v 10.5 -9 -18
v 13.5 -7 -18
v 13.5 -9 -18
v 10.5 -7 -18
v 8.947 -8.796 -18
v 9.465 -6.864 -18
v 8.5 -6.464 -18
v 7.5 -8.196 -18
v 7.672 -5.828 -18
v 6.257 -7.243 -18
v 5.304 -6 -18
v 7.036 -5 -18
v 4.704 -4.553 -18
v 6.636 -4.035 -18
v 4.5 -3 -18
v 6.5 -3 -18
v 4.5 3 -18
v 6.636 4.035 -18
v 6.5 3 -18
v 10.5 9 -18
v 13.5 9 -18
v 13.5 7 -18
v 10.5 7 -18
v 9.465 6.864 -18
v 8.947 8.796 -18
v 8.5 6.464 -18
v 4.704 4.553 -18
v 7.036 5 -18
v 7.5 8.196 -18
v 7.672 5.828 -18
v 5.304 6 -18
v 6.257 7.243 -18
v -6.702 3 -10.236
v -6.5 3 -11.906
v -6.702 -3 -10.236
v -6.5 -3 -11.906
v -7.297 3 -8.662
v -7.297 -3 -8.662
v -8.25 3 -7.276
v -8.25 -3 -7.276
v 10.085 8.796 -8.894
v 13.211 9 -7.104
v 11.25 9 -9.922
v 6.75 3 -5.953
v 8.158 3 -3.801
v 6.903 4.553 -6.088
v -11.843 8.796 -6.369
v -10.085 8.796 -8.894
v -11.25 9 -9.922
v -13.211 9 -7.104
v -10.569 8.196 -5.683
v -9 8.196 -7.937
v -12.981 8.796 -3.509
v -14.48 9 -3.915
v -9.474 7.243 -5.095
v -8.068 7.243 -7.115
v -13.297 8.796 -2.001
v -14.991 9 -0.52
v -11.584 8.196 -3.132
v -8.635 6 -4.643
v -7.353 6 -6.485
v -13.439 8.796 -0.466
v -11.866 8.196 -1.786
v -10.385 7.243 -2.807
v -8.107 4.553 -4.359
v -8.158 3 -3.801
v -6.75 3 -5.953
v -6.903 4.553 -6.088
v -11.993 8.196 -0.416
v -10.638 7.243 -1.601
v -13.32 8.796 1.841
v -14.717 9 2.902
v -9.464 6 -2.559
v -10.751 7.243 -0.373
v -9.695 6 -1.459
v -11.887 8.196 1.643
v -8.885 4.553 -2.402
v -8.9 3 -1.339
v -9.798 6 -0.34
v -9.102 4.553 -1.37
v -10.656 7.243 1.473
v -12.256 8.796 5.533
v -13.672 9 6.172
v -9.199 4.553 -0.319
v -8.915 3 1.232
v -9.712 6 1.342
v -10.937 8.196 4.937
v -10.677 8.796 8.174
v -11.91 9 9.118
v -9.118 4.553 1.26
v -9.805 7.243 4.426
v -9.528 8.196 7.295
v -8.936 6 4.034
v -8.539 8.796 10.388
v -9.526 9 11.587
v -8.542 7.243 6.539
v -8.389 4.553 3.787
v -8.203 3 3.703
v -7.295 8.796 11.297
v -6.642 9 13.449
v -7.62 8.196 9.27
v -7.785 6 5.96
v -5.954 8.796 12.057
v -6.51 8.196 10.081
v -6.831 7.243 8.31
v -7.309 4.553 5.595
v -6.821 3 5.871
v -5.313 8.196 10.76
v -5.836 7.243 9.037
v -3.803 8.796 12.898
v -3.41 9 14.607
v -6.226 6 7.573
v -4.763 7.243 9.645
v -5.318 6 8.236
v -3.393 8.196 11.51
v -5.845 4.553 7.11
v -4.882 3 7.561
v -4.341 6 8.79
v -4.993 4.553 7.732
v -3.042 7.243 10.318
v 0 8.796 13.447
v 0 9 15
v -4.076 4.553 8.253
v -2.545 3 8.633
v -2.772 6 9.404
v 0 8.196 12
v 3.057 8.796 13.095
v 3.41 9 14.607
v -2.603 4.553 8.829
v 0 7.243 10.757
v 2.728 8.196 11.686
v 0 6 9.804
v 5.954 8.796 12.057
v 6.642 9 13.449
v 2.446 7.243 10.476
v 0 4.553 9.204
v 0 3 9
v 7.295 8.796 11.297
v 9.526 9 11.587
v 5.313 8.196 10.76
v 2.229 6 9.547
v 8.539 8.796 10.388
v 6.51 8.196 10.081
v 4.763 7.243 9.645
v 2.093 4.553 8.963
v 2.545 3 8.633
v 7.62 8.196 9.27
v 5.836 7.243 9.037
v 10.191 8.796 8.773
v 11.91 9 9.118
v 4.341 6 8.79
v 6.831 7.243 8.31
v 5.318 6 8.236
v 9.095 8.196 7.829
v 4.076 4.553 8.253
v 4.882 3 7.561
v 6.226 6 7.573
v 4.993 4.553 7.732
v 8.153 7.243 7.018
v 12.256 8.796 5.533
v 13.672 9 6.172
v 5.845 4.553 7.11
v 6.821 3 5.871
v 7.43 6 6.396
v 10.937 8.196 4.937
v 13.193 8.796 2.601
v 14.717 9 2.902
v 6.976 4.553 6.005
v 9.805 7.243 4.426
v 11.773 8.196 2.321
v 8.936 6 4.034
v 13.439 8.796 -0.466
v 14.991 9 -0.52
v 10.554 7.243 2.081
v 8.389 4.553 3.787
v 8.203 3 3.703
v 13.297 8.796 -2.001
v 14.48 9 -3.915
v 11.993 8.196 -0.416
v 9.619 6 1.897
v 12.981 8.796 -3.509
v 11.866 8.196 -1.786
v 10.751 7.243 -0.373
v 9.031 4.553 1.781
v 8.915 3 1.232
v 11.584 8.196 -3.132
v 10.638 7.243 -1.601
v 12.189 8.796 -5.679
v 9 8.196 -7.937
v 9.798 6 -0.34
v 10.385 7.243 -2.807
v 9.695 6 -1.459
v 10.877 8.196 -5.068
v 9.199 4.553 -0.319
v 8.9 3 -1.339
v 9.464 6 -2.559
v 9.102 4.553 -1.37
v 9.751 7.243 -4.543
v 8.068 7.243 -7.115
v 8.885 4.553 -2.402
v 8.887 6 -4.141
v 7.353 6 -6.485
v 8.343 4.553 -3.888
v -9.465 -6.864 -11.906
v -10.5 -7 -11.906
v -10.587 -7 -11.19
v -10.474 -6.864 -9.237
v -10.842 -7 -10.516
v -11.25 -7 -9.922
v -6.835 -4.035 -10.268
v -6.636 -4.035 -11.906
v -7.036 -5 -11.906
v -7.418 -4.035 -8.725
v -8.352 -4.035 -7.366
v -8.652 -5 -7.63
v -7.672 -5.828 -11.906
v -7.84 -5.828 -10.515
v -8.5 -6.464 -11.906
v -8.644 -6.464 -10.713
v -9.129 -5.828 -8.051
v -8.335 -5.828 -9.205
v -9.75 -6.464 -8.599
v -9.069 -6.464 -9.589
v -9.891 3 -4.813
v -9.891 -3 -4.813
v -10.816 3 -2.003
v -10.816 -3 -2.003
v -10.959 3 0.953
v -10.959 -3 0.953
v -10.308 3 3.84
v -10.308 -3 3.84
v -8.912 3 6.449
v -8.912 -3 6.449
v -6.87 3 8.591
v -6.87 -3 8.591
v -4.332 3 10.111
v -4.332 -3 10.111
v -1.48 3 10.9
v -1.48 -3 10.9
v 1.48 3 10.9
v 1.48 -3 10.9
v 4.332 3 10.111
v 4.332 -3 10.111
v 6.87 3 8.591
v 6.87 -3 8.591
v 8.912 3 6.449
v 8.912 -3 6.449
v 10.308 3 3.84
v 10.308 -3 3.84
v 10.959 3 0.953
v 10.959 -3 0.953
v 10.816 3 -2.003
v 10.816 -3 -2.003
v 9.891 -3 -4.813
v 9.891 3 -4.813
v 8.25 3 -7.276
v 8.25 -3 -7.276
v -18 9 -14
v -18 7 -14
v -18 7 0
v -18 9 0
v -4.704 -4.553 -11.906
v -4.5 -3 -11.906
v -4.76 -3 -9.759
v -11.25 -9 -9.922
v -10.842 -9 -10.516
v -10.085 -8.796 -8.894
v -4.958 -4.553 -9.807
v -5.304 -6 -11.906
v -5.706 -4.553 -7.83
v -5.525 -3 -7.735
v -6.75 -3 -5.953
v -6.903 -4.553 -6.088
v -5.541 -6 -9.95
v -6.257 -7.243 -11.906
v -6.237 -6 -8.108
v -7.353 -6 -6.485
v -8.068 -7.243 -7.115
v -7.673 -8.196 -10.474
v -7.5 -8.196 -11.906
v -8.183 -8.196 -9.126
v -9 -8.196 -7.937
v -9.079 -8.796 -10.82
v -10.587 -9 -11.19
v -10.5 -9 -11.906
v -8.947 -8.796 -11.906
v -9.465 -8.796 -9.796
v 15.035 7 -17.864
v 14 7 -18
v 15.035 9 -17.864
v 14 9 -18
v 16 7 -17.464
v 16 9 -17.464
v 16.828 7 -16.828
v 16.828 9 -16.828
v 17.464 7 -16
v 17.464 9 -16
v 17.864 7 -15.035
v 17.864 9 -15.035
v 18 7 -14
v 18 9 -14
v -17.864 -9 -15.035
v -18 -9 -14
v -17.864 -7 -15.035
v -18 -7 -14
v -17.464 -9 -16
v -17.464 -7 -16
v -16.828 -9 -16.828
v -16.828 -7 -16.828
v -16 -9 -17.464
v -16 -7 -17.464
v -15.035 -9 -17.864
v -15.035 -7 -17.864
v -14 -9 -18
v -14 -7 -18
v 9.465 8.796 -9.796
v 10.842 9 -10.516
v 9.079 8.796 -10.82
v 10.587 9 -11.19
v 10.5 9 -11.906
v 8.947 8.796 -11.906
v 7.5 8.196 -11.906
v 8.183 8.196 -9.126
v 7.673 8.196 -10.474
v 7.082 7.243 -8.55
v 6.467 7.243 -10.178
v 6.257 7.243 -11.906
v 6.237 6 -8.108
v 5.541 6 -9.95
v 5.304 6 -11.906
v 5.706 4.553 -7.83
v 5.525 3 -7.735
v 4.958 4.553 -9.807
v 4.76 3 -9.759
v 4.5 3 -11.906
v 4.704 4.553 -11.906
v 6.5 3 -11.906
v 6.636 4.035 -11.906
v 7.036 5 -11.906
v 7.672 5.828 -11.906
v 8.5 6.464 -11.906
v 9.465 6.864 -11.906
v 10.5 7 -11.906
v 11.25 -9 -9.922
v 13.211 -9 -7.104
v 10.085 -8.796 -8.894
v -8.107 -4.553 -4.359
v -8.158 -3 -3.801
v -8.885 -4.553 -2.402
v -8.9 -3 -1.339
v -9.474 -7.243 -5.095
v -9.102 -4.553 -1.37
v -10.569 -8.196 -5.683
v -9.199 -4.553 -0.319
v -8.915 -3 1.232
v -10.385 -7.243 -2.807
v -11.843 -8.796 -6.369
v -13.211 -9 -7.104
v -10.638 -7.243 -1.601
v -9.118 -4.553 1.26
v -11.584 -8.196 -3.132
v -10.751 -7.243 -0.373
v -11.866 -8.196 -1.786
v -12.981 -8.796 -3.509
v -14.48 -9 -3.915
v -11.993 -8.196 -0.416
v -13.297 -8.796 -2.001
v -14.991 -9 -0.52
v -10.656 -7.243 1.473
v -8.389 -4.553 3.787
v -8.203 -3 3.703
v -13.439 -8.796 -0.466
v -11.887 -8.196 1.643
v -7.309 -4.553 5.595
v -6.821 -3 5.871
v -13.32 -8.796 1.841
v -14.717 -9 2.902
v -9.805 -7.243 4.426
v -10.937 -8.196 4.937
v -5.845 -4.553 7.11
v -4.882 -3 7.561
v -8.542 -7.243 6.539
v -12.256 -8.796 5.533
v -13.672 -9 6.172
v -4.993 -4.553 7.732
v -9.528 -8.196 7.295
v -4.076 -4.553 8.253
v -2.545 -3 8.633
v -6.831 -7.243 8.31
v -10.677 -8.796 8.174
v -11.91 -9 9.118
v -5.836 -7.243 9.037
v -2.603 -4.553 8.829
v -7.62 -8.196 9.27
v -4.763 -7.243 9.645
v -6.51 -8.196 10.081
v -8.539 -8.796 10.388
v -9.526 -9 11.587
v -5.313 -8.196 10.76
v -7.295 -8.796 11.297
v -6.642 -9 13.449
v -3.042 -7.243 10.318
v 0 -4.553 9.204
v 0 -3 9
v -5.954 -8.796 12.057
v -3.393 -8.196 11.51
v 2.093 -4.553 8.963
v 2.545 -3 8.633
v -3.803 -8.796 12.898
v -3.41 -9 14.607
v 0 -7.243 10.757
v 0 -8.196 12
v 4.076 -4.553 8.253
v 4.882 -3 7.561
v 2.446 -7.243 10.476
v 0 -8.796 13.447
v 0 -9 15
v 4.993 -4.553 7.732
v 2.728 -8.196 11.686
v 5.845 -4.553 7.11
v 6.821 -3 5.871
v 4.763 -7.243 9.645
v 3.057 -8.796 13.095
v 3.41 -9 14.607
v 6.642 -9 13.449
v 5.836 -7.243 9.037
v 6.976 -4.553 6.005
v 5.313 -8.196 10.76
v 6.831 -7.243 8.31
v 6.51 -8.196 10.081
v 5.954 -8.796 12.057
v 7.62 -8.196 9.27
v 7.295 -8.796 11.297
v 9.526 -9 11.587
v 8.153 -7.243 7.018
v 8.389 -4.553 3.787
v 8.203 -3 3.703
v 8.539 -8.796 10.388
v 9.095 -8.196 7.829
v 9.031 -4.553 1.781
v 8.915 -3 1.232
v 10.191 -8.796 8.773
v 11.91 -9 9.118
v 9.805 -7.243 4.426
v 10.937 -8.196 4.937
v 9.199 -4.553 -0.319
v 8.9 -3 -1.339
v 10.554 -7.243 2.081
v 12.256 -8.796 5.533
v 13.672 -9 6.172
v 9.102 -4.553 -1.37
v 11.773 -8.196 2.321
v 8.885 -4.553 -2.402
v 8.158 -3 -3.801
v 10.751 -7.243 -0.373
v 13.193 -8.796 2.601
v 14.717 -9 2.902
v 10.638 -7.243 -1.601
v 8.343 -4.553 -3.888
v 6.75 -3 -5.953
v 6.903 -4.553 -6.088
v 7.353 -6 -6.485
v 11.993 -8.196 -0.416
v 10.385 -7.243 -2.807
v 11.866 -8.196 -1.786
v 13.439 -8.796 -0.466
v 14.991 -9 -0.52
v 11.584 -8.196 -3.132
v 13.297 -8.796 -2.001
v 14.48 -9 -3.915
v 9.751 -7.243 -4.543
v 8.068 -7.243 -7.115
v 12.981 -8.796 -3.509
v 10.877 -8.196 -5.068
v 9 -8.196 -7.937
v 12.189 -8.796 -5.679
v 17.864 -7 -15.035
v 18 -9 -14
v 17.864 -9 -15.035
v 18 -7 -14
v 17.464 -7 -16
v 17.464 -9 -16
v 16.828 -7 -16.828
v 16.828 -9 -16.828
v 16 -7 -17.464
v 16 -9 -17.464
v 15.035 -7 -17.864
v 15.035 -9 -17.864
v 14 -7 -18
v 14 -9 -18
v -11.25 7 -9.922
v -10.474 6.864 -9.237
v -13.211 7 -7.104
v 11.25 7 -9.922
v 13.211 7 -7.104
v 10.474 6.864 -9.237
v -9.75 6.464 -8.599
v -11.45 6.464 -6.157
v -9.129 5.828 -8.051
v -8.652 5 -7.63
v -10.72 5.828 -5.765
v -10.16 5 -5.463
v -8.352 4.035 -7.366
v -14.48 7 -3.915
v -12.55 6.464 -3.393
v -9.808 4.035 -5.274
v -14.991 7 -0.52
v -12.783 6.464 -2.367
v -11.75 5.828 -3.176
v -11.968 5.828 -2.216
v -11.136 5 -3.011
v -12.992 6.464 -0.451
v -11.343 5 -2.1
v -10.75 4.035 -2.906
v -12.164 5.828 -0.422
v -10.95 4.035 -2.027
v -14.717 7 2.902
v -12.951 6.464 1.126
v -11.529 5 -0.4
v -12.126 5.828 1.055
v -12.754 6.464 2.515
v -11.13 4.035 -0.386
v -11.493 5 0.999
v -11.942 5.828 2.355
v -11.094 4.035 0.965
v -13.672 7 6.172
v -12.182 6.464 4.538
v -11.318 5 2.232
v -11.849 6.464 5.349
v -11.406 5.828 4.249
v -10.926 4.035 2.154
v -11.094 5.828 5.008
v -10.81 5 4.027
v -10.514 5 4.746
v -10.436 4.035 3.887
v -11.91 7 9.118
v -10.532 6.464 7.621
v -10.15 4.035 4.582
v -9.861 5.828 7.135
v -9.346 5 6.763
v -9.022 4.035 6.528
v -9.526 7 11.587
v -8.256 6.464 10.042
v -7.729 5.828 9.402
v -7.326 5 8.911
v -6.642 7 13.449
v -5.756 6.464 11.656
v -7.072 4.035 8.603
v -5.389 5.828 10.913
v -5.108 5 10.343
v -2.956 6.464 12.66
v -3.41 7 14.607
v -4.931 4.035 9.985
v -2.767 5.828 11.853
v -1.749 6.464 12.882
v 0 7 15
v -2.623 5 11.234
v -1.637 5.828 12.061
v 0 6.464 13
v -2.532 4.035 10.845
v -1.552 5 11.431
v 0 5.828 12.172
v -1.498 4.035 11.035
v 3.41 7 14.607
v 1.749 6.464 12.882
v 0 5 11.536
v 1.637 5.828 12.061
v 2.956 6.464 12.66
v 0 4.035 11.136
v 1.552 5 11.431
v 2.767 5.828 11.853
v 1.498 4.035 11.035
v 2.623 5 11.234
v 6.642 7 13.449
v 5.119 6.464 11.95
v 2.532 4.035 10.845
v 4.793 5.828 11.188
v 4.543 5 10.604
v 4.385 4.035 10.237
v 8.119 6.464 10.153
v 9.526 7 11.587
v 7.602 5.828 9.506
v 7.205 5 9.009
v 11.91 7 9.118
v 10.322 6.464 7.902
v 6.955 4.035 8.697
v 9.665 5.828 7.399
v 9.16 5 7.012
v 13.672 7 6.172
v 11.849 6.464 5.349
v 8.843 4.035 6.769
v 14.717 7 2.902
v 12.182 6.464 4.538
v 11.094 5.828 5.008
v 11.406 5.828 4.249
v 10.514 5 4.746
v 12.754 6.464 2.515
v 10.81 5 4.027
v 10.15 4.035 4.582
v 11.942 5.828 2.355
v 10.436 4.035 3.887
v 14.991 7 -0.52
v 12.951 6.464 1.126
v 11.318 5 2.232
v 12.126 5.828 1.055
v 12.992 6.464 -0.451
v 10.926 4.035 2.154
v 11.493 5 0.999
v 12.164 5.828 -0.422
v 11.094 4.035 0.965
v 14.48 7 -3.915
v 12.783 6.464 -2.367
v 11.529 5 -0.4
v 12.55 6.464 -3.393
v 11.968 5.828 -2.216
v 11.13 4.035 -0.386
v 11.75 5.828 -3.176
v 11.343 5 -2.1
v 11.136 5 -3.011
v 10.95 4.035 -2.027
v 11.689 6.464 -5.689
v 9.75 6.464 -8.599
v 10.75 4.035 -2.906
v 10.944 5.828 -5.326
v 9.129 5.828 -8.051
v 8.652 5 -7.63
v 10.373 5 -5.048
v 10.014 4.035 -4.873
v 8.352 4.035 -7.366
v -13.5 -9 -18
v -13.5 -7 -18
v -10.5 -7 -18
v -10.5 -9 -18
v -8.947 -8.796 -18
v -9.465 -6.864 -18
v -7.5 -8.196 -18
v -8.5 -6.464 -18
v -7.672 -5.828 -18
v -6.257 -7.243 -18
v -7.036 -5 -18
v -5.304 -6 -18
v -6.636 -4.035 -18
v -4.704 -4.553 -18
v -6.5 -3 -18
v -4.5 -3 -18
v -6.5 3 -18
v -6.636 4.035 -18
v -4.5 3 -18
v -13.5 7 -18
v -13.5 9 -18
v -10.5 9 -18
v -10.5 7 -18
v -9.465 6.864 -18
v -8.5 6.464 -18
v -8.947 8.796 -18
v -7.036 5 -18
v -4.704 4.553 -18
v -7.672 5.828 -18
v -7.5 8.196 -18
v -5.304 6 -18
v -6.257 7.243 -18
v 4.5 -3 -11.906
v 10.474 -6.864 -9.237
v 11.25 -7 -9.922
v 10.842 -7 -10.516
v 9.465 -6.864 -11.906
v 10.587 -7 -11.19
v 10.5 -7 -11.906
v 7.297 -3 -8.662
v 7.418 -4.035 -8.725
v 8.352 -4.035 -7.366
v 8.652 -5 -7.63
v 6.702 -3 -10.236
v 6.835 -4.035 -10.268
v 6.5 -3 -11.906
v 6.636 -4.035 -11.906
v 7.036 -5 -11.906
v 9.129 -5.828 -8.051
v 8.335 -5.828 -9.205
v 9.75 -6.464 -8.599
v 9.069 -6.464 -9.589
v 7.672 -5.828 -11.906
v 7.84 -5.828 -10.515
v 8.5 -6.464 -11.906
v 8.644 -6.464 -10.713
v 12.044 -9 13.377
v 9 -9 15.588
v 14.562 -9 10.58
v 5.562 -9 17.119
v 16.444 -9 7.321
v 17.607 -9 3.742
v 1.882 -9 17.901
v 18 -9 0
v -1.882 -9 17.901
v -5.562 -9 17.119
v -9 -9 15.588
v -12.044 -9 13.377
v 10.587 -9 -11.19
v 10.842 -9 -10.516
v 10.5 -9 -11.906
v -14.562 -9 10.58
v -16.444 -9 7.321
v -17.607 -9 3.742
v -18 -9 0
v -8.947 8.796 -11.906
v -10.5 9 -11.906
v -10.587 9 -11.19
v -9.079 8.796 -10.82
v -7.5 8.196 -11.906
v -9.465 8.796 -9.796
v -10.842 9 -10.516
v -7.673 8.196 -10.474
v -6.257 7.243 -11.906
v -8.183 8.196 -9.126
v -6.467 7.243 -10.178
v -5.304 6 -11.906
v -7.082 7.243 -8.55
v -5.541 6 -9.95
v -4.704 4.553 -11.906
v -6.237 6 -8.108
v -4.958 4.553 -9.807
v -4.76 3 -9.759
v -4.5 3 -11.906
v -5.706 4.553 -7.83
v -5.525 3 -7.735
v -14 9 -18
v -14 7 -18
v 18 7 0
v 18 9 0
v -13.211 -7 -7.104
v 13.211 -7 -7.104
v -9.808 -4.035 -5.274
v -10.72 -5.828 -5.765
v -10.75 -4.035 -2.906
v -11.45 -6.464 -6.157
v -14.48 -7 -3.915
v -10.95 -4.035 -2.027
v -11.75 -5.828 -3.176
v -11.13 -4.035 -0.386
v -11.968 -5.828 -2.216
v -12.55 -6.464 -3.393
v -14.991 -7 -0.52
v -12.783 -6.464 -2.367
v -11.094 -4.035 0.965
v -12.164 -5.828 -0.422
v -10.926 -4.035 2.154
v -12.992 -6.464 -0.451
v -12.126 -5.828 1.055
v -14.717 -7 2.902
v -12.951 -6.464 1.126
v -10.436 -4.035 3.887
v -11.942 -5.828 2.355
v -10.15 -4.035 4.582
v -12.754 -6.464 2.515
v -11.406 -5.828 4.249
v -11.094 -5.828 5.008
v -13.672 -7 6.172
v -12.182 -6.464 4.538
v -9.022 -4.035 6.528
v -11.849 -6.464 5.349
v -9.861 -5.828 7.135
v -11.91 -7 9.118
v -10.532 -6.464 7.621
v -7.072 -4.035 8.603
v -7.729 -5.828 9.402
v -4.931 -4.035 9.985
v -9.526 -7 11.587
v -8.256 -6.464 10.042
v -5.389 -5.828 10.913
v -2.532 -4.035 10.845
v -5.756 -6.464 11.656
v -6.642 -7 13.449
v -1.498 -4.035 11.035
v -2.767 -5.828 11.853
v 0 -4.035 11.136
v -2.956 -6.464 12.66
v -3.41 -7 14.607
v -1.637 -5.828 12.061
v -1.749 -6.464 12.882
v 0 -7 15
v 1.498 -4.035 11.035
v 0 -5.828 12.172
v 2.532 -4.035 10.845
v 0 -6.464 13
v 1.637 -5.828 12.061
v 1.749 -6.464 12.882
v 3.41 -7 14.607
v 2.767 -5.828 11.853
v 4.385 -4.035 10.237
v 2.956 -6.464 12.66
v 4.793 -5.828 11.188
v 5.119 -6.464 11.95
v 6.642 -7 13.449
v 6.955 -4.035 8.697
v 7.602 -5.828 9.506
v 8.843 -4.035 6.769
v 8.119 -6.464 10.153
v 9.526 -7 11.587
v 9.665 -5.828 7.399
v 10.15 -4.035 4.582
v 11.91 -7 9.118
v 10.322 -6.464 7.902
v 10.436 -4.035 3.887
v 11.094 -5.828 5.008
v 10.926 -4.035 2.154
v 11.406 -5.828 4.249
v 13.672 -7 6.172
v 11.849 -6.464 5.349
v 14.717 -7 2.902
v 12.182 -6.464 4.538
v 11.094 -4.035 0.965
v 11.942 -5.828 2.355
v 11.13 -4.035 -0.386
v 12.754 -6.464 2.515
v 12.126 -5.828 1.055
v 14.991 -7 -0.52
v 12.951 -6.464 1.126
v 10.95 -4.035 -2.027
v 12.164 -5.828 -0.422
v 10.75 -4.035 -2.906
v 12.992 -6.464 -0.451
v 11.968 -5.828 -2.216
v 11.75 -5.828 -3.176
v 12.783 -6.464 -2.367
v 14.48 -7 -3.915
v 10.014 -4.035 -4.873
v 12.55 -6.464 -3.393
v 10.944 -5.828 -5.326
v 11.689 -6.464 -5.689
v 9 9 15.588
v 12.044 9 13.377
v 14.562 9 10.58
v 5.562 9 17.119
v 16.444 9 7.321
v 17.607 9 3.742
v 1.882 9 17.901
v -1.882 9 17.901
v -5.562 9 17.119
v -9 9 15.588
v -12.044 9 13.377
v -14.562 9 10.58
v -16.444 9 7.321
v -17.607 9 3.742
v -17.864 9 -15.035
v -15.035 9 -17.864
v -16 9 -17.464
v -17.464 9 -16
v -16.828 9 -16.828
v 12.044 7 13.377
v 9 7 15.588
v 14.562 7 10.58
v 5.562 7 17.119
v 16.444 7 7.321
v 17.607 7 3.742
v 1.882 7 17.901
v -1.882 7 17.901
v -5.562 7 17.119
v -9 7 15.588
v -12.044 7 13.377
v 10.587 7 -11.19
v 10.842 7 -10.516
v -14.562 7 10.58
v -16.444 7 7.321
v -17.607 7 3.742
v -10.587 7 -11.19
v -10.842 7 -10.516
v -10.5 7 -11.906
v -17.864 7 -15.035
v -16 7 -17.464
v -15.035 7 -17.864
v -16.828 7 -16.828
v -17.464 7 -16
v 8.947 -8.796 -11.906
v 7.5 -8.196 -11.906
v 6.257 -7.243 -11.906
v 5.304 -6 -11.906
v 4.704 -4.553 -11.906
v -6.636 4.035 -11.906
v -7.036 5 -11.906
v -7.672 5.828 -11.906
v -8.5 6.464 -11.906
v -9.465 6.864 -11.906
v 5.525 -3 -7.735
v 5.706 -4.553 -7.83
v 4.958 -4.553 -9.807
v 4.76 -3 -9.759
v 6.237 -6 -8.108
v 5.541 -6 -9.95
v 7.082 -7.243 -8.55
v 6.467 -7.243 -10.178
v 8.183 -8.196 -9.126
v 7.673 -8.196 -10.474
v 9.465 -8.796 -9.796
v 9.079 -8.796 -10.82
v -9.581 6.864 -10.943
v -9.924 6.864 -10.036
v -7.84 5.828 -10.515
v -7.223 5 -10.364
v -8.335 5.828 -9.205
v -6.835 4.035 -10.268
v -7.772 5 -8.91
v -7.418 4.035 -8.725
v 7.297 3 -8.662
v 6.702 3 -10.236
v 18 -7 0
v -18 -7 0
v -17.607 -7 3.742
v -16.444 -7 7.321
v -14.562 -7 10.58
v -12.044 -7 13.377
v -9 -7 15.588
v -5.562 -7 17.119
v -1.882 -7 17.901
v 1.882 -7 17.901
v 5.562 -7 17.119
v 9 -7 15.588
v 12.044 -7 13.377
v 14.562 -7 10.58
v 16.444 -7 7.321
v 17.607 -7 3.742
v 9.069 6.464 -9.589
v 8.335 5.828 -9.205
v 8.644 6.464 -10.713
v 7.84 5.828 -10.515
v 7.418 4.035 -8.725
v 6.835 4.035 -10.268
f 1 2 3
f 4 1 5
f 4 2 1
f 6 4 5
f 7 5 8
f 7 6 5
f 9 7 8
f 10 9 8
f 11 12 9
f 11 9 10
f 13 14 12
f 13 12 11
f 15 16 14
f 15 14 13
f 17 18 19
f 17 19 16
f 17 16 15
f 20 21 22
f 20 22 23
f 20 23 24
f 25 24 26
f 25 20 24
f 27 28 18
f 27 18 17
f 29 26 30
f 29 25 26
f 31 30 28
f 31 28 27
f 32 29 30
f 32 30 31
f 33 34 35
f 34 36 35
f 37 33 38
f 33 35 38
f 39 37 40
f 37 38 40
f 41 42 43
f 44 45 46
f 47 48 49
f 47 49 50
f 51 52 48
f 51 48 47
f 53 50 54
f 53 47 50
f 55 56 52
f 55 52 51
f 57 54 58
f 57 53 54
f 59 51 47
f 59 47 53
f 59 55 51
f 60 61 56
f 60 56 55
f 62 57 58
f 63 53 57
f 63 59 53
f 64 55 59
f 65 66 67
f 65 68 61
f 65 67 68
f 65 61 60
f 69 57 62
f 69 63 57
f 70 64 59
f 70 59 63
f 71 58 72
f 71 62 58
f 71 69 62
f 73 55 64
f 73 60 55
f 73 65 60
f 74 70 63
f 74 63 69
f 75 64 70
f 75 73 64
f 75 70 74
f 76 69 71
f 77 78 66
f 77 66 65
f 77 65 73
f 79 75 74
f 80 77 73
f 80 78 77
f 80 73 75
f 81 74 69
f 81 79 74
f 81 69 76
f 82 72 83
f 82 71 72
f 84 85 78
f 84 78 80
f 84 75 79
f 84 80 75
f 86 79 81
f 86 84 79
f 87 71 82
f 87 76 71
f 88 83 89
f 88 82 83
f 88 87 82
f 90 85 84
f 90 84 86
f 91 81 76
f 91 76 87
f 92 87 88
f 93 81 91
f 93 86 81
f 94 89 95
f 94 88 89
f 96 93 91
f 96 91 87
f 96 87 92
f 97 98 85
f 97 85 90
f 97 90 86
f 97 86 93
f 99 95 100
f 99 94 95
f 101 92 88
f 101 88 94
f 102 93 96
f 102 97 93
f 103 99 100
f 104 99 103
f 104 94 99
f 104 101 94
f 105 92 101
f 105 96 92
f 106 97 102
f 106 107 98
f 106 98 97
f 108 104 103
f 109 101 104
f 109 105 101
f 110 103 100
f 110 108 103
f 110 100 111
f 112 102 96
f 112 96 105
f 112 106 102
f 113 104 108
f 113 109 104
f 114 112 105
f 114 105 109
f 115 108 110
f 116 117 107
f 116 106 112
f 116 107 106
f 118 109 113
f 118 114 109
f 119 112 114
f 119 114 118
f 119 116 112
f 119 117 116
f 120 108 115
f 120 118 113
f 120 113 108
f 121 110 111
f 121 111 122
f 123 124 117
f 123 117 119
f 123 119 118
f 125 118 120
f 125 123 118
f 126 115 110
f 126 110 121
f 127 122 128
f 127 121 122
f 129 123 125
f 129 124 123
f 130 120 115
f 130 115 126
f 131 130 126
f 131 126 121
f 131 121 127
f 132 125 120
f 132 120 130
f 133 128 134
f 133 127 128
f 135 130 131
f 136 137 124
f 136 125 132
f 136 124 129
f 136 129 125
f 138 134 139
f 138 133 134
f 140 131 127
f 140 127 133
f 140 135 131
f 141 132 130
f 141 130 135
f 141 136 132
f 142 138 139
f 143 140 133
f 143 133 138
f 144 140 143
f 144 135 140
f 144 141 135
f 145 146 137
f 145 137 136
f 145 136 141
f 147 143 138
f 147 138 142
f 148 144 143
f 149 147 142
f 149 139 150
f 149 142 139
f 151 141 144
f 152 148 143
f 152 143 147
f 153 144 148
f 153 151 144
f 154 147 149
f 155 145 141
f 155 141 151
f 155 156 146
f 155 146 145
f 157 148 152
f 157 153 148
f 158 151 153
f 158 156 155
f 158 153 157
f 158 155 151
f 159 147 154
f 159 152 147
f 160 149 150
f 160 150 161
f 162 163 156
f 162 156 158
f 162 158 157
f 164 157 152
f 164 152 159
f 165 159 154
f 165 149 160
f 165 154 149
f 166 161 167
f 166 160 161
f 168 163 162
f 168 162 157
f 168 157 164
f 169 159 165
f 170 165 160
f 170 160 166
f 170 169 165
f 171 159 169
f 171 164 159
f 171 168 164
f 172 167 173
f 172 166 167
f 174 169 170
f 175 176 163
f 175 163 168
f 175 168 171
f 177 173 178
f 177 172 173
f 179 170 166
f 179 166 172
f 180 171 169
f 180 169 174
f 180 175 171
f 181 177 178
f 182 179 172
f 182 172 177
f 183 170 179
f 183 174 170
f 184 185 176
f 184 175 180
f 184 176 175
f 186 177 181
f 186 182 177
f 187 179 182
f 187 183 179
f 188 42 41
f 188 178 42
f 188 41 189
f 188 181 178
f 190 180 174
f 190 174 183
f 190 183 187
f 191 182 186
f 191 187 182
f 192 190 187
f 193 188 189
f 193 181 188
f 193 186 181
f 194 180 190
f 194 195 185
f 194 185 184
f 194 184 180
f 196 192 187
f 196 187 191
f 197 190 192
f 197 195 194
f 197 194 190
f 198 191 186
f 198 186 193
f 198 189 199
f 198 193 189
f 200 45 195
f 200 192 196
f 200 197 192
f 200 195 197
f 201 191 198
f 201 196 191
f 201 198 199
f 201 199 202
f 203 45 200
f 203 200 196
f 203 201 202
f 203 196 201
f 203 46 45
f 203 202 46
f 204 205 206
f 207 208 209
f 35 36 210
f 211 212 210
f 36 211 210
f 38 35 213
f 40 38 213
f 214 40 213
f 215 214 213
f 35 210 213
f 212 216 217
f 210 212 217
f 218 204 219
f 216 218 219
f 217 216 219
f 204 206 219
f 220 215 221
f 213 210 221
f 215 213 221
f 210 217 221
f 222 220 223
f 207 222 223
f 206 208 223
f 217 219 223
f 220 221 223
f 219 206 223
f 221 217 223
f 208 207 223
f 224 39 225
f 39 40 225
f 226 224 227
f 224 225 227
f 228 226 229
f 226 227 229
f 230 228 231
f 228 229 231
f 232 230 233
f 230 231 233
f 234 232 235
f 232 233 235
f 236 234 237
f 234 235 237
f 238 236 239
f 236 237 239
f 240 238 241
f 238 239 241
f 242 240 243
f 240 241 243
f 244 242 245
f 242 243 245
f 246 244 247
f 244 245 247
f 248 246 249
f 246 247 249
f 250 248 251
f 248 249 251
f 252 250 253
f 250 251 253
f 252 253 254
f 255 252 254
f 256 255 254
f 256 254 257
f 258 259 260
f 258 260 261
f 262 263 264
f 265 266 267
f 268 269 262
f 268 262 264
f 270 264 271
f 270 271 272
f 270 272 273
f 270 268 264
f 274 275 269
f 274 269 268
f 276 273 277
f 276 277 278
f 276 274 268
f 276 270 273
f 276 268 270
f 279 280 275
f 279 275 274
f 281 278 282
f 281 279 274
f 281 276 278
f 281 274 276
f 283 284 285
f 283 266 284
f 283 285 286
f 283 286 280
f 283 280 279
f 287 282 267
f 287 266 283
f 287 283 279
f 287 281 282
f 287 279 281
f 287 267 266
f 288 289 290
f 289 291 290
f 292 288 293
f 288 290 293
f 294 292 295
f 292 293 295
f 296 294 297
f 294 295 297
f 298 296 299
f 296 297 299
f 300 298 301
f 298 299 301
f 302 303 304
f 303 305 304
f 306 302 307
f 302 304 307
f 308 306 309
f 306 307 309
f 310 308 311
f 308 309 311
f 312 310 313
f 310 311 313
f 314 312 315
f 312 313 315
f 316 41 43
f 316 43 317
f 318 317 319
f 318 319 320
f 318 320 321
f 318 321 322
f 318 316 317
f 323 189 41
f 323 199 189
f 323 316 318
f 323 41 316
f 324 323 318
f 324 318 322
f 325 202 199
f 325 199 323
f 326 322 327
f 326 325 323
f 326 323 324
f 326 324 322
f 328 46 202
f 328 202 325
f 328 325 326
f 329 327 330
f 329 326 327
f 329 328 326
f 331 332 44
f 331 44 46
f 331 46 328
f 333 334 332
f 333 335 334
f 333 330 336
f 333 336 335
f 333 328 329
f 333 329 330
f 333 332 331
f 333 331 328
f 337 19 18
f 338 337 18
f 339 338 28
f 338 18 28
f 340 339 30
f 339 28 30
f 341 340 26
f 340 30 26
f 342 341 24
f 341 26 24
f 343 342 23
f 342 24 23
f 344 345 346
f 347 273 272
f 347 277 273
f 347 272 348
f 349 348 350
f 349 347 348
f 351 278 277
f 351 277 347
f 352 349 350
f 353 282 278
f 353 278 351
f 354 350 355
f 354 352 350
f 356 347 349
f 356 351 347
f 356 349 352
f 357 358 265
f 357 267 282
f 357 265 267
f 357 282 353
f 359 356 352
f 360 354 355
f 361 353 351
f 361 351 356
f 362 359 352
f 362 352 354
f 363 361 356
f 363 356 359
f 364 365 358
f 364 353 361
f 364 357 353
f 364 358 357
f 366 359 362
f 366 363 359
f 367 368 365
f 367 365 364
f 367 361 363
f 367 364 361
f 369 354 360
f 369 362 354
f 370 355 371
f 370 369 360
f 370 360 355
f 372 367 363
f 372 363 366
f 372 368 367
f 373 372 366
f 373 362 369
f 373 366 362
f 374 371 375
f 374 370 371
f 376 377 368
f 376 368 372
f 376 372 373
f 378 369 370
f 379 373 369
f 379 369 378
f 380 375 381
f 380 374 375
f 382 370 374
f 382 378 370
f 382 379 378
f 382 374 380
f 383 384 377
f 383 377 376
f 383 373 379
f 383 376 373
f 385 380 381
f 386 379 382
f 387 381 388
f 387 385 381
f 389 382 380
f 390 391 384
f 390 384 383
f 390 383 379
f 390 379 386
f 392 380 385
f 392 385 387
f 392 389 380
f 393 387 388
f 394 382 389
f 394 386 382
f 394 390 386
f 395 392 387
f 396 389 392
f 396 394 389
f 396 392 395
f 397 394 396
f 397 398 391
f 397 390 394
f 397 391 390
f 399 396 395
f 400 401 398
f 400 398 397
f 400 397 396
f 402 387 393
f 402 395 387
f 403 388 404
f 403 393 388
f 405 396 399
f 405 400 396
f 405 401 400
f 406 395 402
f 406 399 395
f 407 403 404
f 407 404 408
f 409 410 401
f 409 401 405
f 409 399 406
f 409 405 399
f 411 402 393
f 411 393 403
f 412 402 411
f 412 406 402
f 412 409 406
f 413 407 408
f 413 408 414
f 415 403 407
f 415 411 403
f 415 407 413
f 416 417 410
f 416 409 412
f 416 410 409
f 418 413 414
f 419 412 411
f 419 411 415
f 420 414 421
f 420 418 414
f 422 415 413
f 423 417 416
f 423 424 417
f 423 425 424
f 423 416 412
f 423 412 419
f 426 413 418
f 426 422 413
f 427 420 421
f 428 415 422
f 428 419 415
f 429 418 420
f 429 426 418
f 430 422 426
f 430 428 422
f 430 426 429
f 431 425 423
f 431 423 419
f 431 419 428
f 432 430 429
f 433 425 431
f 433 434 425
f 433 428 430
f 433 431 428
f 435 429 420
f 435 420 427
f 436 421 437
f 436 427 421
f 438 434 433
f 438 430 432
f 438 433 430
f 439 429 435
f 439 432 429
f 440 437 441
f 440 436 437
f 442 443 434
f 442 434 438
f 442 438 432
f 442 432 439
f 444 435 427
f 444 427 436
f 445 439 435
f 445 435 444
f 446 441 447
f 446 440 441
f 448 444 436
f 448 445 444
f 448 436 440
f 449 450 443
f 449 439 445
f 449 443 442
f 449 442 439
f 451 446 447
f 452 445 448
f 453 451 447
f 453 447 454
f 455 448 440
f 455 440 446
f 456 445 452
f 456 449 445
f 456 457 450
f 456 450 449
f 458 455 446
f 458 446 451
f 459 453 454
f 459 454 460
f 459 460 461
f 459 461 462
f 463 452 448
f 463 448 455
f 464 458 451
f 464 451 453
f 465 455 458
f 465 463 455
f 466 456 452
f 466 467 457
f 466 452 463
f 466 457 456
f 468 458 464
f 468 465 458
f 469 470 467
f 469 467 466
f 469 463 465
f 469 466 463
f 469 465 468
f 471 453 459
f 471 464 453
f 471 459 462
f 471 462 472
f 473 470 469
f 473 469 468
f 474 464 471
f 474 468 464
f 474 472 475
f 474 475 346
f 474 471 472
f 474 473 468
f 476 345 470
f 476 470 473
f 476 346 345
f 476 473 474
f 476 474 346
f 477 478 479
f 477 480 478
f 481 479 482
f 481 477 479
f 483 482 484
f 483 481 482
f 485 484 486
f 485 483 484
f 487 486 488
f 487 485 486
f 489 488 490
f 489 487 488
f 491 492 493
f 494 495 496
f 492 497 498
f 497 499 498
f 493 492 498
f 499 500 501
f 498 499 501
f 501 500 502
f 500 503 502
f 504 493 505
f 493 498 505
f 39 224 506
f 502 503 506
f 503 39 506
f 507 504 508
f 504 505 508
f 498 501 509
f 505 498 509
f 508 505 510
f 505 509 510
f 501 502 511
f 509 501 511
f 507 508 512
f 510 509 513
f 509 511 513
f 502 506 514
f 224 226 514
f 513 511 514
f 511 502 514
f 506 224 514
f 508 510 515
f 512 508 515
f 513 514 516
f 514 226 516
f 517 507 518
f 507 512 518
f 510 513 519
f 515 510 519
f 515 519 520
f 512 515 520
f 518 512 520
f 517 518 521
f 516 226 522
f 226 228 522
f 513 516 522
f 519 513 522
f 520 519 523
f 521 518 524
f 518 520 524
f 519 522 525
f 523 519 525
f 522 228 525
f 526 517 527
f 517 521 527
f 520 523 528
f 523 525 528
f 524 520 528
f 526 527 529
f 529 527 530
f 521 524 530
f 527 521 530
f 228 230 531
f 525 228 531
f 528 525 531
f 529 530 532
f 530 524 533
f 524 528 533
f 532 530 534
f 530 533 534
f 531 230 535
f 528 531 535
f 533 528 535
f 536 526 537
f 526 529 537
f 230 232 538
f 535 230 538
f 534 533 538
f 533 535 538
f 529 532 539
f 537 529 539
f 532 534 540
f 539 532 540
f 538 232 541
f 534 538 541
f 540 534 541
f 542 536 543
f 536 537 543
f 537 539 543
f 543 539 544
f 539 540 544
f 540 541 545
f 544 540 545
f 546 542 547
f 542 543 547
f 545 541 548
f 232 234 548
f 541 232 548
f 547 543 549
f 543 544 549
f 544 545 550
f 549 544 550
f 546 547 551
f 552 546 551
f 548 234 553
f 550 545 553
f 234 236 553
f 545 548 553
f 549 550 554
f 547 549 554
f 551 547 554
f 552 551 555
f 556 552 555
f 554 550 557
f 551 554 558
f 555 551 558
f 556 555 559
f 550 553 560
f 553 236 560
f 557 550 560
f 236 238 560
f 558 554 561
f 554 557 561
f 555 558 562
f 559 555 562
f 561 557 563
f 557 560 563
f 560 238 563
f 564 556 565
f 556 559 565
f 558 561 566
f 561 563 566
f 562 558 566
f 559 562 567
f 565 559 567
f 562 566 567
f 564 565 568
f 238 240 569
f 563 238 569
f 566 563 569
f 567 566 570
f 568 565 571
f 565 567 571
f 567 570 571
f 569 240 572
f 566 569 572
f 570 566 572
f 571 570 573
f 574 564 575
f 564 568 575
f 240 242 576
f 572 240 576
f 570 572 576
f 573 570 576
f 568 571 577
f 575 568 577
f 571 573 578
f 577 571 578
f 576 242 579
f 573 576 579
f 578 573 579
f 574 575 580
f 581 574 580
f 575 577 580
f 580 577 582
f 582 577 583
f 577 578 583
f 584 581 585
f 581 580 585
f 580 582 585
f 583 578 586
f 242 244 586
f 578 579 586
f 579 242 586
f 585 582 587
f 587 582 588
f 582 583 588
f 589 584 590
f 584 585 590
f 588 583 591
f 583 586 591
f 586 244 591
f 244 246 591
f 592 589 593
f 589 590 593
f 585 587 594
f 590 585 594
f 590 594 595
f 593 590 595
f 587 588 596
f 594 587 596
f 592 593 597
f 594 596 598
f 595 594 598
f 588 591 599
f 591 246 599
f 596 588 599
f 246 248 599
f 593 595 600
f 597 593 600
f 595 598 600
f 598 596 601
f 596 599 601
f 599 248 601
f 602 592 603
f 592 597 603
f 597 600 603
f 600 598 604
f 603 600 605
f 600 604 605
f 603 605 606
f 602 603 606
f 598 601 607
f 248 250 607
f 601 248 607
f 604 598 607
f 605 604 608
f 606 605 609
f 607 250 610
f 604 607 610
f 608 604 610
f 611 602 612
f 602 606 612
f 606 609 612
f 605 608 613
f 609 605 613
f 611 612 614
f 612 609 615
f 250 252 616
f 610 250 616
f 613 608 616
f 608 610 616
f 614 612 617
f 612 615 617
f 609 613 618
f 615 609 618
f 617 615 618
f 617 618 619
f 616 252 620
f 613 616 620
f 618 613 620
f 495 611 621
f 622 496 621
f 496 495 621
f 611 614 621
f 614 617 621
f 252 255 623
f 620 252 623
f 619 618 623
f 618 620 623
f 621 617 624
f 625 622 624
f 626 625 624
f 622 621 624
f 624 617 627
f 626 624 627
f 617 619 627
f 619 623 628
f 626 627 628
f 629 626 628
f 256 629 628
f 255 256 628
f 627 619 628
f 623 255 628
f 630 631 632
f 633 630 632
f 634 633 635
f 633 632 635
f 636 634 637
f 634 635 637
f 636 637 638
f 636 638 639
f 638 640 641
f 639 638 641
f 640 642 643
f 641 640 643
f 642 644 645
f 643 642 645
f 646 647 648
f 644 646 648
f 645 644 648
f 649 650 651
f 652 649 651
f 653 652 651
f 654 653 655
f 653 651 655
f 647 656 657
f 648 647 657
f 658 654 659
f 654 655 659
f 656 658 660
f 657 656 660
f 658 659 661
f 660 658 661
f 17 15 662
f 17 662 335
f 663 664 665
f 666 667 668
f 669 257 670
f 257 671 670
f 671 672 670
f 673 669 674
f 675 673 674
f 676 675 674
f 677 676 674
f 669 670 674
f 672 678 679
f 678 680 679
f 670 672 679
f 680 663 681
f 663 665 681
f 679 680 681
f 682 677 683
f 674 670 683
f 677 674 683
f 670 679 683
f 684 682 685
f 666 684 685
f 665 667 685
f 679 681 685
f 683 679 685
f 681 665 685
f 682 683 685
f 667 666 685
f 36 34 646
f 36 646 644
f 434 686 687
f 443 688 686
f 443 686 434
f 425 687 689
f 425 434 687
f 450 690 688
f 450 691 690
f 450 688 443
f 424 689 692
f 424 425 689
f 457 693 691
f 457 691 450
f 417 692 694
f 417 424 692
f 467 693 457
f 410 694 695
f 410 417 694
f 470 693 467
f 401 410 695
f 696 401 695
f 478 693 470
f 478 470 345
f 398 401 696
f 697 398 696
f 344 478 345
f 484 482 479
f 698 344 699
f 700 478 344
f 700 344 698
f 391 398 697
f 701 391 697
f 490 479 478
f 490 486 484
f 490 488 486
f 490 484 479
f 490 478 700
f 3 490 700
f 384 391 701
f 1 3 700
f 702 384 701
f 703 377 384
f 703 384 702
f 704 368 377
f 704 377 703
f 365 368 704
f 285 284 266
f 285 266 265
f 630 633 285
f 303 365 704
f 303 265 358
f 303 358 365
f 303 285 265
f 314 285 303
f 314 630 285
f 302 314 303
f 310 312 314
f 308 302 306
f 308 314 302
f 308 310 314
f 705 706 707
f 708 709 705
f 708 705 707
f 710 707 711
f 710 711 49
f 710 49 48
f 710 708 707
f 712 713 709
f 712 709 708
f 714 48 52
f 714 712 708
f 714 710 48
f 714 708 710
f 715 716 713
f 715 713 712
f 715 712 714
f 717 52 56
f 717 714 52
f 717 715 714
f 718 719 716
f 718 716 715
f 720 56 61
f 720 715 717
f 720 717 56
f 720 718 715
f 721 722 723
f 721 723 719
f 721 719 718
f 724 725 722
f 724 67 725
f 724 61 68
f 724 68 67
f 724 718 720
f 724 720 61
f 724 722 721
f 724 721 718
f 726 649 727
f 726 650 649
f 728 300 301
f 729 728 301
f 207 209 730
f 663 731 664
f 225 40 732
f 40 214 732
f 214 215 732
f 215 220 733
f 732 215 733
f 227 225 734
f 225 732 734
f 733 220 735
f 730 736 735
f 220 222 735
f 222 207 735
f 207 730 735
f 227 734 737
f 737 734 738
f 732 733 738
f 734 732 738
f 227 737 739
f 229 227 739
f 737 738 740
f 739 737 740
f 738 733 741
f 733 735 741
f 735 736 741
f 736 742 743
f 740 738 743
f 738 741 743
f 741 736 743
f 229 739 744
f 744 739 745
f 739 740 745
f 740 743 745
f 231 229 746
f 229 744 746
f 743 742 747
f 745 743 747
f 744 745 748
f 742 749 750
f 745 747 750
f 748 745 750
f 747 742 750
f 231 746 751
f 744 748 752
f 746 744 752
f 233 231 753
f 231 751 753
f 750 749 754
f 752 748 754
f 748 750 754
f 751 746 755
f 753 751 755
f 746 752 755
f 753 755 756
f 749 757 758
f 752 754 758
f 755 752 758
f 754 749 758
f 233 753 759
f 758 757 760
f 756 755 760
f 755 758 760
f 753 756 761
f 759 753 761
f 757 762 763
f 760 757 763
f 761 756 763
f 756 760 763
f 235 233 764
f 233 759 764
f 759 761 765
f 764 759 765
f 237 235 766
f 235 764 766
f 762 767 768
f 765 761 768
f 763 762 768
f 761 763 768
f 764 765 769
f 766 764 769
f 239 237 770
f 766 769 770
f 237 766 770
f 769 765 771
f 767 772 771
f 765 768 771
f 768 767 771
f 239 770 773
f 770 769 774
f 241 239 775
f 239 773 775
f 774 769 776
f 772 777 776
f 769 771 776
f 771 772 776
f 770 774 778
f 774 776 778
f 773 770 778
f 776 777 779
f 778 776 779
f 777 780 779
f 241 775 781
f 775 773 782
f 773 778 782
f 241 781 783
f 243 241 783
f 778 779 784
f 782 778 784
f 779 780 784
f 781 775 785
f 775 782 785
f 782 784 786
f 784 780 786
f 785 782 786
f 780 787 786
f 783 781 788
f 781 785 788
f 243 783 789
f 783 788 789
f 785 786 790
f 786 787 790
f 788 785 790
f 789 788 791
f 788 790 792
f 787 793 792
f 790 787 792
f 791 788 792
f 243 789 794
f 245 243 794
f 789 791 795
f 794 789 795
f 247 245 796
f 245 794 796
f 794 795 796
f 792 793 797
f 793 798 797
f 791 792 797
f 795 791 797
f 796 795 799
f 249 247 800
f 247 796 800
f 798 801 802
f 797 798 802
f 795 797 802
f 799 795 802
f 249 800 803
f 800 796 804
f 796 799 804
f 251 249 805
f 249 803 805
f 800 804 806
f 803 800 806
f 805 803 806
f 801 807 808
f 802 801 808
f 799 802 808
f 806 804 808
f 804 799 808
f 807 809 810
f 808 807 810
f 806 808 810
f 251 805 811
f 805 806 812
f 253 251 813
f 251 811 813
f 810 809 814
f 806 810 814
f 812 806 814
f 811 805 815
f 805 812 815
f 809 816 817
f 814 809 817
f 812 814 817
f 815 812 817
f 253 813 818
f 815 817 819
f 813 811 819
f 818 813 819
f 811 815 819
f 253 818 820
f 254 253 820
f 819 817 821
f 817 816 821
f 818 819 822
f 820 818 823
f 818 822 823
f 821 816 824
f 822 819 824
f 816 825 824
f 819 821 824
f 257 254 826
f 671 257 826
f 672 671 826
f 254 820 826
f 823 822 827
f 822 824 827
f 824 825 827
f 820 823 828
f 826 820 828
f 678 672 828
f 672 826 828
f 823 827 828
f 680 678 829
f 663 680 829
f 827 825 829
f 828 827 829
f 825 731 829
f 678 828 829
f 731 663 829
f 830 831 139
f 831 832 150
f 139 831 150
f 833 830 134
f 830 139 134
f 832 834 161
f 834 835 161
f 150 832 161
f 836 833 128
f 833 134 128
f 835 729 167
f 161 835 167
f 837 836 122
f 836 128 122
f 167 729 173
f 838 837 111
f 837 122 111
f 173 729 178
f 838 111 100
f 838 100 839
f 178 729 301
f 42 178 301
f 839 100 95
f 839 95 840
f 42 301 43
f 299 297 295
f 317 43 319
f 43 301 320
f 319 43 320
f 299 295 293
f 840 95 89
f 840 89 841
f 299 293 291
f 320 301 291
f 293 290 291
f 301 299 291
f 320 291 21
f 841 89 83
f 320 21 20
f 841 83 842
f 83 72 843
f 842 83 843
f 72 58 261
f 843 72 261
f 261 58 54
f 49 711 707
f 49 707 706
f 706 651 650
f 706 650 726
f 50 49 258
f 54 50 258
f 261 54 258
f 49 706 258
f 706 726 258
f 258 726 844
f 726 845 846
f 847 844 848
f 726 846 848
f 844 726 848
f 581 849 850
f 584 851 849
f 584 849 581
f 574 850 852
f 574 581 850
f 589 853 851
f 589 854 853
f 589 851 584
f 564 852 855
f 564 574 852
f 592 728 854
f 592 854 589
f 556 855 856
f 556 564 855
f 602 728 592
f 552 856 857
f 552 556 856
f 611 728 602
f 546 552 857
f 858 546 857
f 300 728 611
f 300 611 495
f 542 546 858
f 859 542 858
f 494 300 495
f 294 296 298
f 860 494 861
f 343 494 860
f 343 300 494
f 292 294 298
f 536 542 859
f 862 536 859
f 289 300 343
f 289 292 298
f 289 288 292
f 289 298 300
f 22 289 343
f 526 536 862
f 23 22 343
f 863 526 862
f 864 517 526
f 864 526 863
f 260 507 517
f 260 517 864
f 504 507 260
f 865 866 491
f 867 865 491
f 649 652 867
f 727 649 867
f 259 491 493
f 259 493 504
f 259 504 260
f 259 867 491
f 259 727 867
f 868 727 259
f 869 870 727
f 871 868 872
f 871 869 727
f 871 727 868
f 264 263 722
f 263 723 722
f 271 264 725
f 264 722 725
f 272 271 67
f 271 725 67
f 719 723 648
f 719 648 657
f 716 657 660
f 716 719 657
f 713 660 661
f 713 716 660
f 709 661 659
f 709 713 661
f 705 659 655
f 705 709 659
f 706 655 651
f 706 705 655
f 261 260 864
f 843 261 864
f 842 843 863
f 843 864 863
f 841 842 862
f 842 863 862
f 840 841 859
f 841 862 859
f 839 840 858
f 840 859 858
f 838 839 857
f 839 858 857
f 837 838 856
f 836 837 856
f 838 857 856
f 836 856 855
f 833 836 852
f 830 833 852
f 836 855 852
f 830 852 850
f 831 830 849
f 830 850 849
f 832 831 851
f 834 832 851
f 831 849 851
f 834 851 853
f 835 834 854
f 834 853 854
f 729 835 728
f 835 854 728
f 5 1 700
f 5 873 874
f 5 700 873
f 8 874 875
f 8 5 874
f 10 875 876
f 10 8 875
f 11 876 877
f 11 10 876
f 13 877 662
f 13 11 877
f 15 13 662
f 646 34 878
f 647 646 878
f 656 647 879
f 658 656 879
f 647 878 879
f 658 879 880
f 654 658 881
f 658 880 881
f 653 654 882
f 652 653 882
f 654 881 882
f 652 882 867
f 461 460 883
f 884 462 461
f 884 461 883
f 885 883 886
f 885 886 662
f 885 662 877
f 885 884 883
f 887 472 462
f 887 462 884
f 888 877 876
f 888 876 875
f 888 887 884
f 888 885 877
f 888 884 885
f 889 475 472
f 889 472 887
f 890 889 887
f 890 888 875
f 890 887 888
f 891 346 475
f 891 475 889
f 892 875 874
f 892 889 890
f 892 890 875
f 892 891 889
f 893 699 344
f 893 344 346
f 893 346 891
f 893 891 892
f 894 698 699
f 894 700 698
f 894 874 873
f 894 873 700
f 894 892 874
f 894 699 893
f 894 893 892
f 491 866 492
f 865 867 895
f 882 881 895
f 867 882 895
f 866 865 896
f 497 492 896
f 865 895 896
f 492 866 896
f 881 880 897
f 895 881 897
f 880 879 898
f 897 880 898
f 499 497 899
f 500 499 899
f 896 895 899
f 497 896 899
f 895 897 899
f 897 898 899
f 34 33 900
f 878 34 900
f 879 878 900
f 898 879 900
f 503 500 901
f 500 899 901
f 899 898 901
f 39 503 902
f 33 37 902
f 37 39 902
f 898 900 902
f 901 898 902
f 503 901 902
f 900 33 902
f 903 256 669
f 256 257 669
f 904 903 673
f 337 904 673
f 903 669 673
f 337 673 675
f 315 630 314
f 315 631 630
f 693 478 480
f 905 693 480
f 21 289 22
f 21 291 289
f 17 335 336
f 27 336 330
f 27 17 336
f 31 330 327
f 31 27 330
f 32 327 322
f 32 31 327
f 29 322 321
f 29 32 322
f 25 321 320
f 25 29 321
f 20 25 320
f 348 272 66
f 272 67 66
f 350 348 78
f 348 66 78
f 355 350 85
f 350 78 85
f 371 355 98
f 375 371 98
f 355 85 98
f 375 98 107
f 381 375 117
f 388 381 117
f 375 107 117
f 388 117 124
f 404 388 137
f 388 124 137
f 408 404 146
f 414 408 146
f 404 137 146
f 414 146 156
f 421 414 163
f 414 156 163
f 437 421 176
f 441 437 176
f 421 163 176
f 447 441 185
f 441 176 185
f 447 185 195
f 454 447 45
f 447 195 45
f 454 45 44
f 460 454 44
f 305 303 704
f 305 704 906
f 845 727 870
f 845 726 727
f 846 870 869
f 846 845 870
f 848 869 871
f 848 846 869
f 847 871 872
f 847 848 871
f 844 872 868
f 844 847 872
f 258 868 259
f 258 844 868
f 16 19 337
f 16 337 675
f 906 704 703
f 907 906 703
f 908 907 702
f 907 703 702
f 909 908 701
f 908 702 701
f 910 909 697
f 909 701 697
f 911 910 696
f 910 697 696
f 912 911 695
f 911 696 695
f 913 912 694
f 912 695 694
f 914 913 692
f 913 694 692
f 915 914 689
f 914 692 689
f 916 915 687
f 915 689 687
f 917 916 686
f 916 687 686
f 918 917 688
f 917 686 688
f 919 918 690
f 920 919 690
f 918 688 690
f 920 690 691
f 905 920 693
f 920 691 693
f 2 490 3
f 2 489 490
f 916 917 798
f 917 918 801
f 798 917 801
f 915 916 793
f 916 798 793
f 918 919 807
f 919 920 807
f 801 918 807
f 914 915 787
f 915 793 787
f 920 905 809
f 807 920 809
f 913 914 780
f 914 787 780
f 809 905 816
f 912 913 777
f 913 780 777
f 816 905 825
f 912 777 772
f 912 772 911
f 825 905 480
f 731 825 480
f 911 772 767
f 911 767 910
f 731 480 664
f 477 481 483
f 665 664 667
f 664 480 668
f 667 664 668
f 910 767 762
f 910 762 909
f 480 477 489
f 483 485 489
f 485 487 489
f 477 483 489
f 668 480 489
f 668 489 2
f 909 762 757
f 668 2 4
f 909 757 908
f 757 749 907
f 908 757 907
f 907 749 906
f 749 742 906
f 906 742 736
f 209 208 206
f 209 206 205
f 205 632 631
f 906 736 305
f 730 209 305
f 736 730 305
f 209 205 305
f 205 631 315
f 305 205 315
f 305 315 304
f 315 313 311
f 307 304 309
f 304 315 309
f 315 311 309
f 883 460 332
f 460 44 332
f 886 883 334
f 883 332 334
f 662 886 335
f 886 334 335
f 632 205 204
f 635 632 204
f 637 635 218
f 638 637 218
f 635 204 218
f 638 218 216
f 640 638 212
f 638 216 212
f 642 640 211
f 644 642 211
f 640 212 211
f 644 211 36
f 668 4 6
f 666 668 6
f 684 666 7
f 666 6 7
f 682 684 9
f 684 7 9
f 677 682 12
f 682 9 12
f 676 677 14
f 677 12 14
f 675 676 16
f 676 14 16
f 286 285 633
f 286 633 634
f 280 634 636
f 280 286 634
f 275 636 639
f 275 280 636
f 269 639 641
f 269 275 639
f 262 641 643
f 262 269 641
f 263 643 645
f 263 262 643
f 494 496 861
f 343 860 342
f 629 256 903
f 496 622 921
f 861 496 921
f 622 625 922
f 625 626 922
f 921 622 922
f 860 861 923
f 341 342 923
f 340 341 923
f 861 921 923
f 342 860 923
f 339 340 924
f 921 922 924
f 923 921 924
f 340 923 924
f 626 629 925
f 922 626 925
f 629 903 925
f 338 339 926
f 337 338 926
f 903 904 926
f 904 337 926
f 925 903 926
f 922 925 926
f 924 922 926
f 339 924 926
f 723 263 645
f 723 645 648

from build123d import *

# Parameters (mm, degrees)
BOSS_EXTRUDE1_REACH      = 43.243
BOSS_EXTRUDE1_END_RADIUS = 18
SKETCH4_W                = 4.5
SKETCH4_H                = 2
FILLET1_R                = 4


with BuildPart() as part:
    # Sweep1: sweep along a path in Sketch1
    with BuildLine(Plane(origin=(0, 0, 0), x_dir=(1, 0, 0), z_dir=(0, 1, 0))) as sweep1_path:
        Line((-4.5, 18), (-4.5, 11.9058809))
        ThreePointArc((-4.5, 11.9058809), (-5.08127088, 8.723900384), (-6.75, 5.95294045))
        ThreePointArc((-6.75, 5.95294045), (0, -9), (6.75, 5.95294045))
        ThreePointArc((6.75, 5.95294045), (5.08127088, 8.723900384), (4.5, 11.9058809))
        Line((4.5, 11.9058809), (4.5, 18))
    # Sketch3 → Sweep1 (sweep)
    with BuildSketch(Plane(origin=(0, 0, 0), x_dir=(0, 0, -1), z_dir=(1, 0, 0))):
        with BuildLine():
            Line((-18, 9), (-15, 9))
            ThreePointArc((-15, 9), (-10.757359313, 7.242640687), (-9, 3))
            Line((-9, 3), (-9, 0))
            Line((-9, 0), (-9, -3))
            ThreePointArc((-9, -3), (-10.757359313, -7.242640687), (-15, -9))
            Line((-15, -9), (-18, -9))
            Line((-18, -9), (-18, -7))
            Line((-18, -7), (-15, -7))
            ThreePointArc((-15, -7), (-12.171572875, -5.828427125), (-11, -3))
            Line((-11, -3), (-11, 3))
            ThreePointArc((-11, 3), (-12.171572875, 5.828427125), (-15, 7))
            Line((-15, 7), (-18, 7))
            Line((-18, 7), (-18, 9))
        make_face()
    sweep(path=sweep1_path.line)

    # Boss-Extrude1: up to this cylinder (the profile starts outside it)
    boss_extrude1_end = Plane(origin=(0, 0, 0), z_dir=(0, 1, 0)) * Cylinder(BOSS_EXTRUDE1_END_RADIUS, 139.486, mode=Mode.PRIVATE)
    # Sketch4 → Boss-Extrude1 (add, up to the surface)
    with BuildSketch(Plane(origin=(0, 0, -18), x_dir=(-1, 0, 0), z_dir=(0, 0, -1)), mode=Mode.PRIVATE) as boss_extrude1_sk1:
        with Locations((-15.75, 8)):
            Rectangle(SKETCH4_W, SKETCH4_H)
    boss_extrude1_tool1 = extrude(boss_extrude1_sk1.sketch, amount=-BOSS_EXTRUDE1_REACH, mode=Mode.PRIVATE) - boss_extrude1_end
    add(boss_extrude1_tool1.solids().sort_by_distance((15.75, 8, -18))[0])
    # Sketch4 → Boss-Extrude1 (add, up to the surface)
    with BuildSketch(Plane(origin=(0, 0, -18), x_dir=(-1, 0, 0), z_dir=(0, 0, -1)), mode=Mode.PRIVATE) as boss_extrude1_sk2:
        with Locations((15.75, 8)):
            Rectangle(SKETCH4_W, SKETCH4_H)
    boss_extrude1_tool2 = extrude(boss_extrude1_sk2.sketch, amount=-BOSS_EXTRUDE1_REACH, mode=Mode.PRIVATE) - boss_extrude1_end
    add(boss_extrude1_tool2.solids().sort_by_distance((-15.75, 8, -18))[0])
    # Sketch4 → Boss-Extrude1 (add, up to the surface)
    with BuildSketch(Plane(origin=(0, 0, -18), x_dir=(-1, 0, 0), z_dir=(0, 0, -1)), mode=Mode.PRIVATE) as boss_extrude1_sk3:
        with Locations((15.75, -8)):
            Rectangle(SKETCH4_W, SKETCH4_H)
    boss_extrude1_tool3 = extrude(boss_extrude1_sk3.sketch, amount=-BOSS_EXTRUDE1_REACH, mode=Mode.PRIVATE) - boss_extrude1_end
    add(boss_extrude1_tool3.solids().sort_by_distance((-15.75, -8, -18))[0])
    # Sketch4 → Boss-Extrude1 (add, up to the surface)
    with BuildSketch(Plane(origin=(0, 0, -18), x_dir=(-1, 0, 0), z_dir=(0, 0, -1)), mode=Mode.PRIVATE) as boss_extrude1_sk4:
        with Locations((-15.75, -8)):
            Rectangle(SKETCH4_W, SKETCH4_H)
    boss_extrude1_tool4 = extrude(boss_extrude1_sk4.sketch, amount=-BOSS_EXTRUDE1_REACH, mode=Mode.PRIVATE) - boss_extrude1_end
    add(boss_extrude1_tool4.solids().sort_by_distance((15.75, -8, -18))[0])

    # Fillet1
    fillet1_edges = [part.edges().sort_by_distance(p)[0] for p in [
        (18, -8, -18),
        (-18, -8, -18),
        (-18, 8, -18),
        (18, 8, -18),
    ]]
    fillet(fillet1_edges, radius=FILLET1_R)


solid = part.part
